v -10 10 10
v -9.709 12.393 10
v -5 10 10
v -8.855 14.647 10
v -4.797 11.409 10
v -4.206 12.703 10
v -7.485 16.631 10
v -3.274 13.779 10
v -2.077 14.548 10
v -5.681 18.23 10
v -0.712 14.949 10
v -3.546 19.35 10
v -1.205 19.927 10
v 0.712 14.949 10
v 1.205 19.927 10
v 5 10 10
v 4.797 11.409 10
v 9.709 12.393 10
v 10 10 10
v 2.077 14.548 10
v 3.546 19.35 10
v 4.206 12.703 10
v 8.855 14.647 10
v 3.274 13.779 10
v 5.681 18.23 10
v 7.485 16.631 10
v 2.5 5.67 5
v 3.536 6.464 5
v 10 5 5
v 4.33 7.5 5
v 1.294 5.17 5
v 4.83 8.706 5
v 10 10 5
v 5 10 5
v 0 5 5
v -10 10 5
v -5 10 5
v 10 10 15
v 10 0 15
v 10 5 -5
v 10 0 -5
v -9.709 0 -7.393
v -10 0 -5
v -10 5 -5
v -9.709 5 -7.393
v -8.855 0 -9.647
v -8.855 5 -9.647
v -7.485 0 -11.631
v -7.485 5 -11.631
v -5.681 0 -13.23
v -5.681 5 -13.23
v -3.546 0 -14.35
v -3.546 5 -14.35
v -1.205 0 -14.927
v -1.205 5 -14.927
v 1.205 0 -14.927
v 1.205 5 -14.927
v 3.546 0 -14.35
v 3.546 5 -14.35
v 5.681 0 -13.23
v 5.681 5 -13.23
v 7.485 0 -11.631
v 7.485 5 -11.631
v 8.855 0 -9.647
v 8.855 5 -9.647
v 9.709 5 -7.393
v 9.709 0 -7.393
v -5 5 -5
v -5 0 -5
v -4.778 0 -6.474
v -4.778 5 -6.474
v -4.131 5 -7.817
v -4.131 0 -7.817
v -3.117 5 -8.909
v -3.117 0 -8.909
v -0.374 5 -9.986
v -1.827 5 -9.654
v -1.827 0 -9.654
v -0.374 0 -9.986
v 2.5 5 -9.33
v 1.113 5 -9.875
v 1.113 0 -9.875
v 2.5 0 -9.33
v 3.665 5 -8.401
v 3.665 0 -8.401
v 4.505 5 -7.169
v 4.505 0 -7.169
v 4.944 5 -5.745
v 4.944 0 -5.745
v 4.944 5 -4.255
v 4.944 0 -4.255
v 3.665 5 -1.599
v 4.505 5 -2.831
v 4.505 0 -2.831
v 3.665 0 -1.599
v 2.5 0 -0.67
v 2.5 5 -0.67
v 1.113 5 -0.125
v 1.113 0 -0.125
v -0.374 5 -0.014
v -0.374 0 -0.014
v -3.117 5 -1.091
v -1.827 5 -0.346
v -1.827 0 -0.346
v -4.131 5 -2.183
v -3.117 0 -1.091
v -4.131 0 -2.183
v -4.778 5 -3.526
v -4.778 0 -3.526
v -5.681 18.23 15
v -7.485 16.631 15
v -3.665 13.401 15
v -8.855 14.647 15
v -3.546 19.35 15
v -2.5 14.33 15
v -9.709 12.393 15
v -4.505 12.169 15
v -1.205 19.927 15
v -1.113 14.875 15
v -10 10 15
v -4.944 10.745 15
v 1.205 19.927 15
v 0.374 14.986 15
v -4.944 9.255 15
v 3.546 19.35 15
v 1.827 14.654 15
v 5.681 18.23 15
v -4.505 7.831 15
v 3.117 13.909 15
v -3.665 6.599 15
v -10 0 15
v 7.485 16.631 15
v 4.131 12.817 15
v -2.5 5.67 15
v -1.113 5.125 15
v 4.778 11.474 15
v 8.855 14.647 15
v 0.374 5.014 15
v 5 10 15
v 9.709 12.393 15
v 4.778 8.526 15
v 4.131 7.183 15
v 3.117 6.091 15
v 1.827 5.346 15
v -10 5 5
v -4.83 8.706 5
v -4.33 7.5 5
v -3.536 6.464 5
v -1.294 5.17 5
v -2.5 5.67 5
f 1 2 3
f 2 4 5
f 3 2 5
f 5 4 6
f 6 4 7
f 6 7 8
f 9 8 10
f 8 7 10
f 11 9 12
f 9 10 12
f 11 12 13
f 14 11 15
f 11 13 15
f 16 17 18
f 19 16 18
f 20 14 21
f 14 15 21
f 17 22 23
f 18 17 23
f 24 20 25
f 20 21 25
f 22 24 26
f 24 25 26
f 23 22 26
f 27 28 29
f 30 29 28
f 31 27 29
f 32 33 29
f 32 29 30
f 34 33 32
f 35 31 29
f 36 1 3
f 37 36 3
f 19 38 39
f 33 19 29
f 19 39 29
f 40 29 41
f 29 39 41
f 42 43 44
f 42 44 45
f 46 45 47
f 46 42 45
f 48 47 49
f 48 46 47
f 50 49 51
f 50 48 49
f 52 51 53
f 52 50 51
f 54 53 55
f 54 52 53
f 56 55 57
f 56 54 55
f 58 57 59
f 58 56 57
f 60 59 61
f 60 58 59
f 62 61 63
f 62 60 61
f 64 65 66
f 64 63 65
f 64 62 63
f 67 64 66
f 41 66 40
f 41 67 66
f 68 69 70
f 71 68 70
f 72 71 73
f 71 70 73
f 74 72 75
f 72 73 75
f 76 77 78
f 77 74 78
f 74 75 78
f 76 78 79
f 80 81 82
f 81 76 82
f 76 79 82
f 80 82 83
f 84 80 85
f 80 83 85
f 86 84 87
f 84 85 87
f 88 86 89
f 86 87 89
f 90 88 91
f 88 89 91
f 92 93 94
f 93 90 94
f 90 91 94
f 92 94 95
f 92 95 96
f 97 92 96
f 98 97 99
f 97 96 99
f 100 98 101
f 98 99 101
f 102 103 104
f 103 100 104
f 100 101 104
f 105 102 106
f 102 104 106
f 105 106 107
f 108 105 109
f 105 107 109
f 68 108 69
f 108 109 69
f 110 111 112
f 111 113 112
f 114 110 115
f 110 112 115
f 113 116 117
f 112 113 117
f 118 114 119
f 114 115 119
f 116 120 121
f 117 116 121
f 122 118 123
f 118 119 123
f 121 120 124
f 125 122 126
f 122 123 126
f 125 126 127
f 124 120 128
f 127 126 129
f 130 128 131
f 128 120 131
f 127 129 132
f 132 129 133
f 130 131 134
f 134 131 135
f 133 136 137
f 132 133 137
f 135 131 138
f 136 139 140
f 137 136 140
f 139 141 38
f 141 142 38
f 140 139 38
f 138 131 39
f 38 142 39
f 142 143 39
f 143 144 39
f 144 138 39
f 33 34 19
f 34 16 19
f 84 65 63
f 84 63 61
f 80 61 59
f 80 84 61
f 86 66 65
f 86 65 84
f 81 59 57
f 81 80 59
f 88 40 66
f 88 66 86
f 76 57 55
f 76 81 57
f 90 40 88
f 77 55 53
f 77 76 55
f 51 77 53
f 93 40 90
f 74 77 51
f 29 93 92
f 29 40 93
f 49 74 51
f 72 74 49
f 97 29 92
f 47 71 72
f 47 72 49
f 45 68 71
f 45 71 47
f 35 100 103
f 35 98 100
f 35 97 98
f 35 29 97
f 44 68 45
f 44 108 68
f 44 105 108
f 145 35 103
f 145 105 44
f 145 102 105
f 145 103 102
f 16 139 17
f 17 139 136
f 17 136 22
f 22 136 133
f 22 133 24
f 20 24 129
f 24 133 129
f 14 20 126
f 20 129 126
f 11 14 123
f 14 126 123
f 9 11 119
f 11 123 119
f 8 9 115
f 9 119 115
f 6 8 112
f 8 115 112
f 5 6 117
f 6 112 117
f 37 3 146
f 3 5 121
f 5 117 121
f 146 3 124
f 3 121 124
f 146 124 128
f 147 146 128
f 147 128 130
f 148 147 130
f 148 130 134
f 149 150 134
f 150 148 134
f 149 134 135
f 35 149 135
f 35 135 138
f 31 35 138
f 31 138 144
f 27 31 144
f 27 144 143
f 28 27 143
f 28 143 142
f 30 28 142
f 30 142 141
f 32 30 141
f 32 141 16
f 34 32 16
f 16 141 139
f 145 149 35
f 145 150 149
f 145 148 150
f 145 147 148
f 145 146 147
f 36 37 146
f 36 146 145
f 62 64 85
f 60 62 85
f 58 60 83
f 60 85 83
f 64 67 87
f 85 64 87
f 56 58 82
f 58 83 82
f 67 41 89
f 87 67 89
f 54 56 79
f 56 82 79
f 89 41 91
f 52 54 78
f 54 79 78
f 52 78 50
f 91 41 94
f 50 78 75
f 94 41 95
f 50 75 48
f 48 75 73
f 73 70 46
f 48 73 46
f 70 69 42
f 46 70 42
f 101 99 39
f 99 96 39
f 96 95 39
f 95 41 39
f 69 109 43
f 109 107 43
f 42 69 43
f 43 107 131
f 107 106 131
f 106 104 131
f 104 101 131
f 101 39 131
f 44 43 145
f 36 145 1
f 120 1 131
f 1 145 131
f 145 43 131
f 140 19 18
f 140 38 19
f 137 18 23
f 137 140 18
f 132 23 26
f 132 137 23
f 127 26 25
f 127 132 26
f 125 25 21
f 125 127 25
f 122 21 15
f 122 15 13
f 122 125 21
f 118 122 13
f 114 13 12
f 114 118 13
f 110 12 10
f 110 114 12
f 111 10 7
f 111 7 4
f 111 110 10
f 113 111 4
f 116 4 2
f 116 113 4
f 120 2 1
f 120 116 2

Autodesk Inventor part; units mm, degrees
ref_plane "YZ Plane" through (0, 0, 0) normal (1, 0, 0) x (0, 1, 0)
ref_plane "XZ Plane" through (0, 0, 0) normal (0, 1, 0) x (-1, 0, 0)
ref_plane "XY Plane" through (0, 0, 0) normal (0, 0, 1) x (1, 0, 0)
sketch "草圖1" plane through (0, 0, 0) normal (0, 1, 0) x (-1, 0, 0)
  line L0 (10, 15) -> (-10, 15)
  line L1 (-10, 15) -> (-10, -5)
  line L2 (-10, -15) -> (10, -15) construction
  line L3 (10, -15) -> (10, -5) construction
  arc A0 (-10, -5) -> (10, -5) centre (0, -5) ccw
  line L4 (10, -5) -> (10, 15)
  line L5 (-10, -5) -> (-10, -15) construction
  circle A1 centre (0, -5) radius 5
  point P0 (0, 0)
  point P1 (10, 0)
  point P2 (0, 15)
  dimension "d0" = 30
  dimension "d1" = 20
  dimension "d2" = 5
  dimension "d3" = 10
extrude "擠出1" add sketch "草圖1" along normal blind 5
sketch "草圖2" plane through (-10, 0, 15) normal (0, 0, 1) x (1, 0, 0)
  line L0 (0, 0) -> (20, 0) construction
  line L1 (20, 0) -> (20, 5) construction
  line L2 (0, 5) -> (20, 5) construction
  line L3 (0, 0) -> (0, 5) construction
  line L4 (0, 5) -> (20, 5) projected
  line L5 (0, 5) -> (20, 5)
  line L6 (20, 5) -> (20, 10)
  line L7 (0, 10) -> (0, 5)
  arc A0 (20, 10) -> (0, 10) centre (10, 10) ccw
  circle A1 centre (10, 10) radius 5
  point P0 (10, 0)
  dimension "d6" = 5
  dimension "d7" = 10
  dimension "d8" = 10
extrude "擠出2" add sketch "草圖2" against normal blind 5
sketch "草圖3" plane through (-10, 0, 10) normal (0, 0, -1) x (-1, 0, 0)
  line L0 (-10, 5) -> (-20, 5) projected
  circle A0 centre (-10, 10) radius 5 projected
  line L1 (0, 5) -> (-10, 5) projected
  line L2 (0, 5) -> (0, 10) projected
  arc A1 (0, 10) -> (-20, 10) centre (-10, 10) ccw projected
  line L3 (-20, 10) -> (-20, 5) projected
  line L4 (-20, 10) -> (-20, 5) projected
  line L5 (0, 5) -> (0, 10) projected
  line L6 (-20, 5) -> (0, 5)
  line L7 (0, 5) -> (0, 10)
  line L8 (0, 10) -> (-5, 10)
  line L9 (-20, 10) -> (-20, 5)
  line L10 (-15, 10) -> (-20, 10)
  line L11 (-5, 10) -> (-15, 10) construction
  point P0 (-10, 0)
  dimension "d11" = 5
extrude "擠出3" add sketch "草圖3" along normal blind 5 contours L0 L3 L10 A0 | A0 L8 L2 L1
properties part number "8"
